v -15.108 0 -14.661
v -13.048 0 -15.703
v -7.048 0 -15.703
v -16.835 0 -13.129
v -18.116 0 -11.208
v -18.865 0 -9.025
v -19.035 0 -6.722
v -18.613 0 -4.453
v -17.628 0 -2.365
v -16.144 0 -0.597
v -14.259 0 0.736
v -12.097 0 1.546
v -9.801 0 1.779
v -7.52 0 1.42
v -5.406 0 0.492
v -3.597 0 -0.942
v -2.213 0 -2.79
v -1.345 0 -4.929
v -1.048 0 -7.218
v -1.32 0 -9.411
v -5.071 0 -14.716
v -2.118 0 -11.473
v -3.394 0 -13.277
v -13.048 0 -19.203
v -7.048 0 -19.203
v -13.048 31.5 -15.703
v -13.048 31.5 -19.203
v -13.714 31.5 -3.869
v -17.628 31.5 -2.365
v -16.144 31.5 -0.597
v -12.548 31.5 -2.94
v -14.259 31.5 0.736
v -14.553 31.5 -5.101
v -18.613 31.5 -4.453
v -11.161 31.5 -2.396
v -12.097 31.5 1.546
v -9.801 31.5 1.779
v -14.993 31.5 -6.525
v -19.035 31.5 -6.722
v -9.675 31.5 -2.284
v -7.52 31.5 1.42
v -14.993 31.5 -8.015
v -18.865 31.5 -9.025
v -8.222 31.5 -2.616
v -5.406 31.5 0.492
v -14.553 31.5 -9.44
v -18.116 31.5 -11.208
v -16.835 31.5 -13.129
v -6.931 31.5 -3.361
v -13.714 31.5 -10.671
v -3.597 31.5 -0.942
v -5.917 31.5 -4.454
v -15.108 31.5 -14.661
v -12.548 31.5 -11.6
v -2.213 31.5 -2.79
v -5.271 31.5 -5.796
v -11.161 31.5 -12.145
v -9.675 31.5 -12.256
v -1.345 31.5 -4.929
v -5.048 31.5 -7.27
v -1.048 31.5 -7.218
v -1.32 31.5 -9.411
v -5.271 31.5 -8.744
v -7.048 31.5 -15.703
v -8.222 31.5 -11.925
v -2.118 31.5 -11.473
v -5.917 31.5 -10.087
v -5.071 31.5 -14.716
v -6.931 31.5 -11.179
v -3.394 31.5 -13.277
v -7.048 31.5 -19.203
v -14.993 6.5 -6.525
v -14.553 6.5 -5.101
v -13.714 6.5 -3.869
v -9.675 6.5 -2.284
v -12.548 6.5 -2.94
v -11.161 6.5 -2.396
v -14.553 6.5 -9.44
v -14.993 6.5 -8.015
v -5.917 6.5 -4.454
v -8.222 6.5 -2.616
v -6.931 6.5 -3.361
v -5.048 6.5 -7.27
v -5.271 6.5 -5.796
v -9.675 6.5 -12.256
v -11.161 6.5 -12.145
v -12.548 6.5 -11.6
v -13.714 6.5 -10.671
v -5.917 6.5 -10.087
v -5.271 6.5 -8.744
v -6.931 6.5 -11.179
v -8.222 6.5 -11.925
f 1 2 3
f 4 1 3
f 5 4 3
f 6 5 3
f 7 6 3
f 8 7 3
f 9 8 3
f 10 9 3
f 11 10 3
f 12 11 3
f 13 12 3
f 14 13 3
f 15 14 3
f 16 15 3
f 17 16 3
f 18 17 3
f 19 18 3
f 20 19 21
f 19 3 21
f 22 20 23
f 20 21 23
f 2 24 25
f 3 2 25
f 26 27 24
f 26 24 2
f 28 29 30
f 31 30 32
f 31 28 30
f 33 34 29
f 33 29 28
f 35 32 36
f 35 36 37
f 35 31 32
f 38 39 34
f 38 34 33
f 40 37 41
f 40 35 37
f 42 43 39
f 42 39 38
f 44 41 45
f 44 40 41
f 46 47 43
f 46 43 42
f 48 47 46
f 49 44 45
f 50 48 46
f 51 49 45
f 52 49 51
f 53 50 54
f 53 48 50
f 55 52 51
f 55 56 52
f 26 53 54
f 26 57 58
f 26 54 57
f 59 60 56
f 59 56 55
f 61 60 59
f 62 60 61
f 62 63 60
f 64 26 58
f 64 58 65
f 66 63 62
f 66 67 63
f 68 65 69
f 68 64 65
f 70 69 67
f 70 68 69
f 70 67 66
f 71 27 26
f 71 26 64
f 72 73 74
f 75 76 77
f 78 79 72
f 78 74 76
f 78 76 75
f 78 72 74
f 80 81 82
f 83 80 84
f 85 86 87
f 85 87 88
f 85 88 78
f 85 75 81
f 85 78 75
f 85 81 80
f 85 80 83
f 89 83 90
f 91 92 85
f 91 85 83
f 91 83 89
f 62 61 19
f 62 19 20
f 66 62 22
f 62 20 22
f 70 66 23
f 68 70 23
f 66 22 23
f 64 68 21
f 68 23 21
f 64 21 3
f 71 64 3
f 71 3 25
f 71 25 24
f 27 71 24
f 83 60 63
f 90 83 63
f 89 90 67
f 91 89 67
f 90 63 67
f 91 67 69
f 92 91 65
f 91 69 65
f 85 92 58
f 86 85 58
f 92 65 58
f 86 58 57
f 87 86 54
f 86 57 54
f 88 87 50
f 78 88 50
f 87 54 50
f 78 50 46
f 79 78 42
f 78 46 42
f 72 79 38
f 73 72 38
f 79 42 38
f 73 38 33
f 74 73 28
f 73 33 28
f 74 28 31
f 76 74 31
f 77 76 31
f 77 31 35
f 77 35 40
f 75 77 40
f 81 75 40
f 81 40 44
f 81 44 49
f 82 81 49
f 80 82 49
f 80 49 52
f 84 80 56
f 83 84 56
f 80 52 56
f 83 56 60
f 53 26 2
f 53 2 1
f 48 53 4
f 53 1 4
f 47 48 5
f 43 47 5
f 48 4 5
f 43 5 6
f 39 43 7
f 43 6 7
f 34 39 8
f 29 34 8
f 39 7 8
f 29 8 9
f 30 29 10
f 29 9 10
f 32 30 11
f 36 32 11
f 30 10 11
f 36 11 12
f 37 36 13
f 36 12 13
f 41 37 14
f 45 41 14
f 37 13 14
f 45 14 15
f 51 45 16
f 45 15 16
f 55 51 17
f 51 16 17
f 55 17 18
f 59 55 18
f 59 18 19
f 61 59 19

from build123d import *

# Parameters (mm, degrees)
BOSS_EXTRUDE1_DEPTH = 31.5
SKETCH5_R           = 5
CUT_EXTRUDE1_DEPTH  = 25


with BuildPart() as part:
    # Sketch1 → Boss-Extrude1 (new body)
    with BuildSketch(Plane(origin=(0, 0, 0), x_dir=(1, 0, 0), z_dir=(0, 1, 0))):
        with BuildLine():
            ThreePointArc((-1.048467756, 7.218012428), (-2.699998527, 12.414164851), (-7.048467756, 15.703293803))
            ThreePointArc((-7.048467756, 15.703293803), (-10.048467756, 16.218012428), (-13.048467756, 15.703293803))
            ThreePointArc((-13.048467756, 15.703293803), (-15.244620178, -0.1304568), (-1.048467756, 7.218012428))
        make_face()
        with BuildLine():
            ThreePointArc((-13.048467756, 15.703293803), (-10.048467756, 16.218012428), (-7.048467756, 15.703293803))
            Line((-7.048467756, 15.703293803), (-7.048467756, 19.203293803))
            Line((-7.048467756, 19.203293803), (-13.048467756, 19.203293803))
            Line((-13.048467756, 19.203293803), (-13.048467756, 15.703293803))
        make_face()
    extrude(amount=BOSS_EXTRUDE1_DEPTH)

    # Sketch5 → Cut-Extrude1 (cut)
    with BuildSketch(Plane(origin=(0, 31.5, 0), x_dir=(1, 0, 0), z_dir=(0, 1, 0))):
        with Locations((-10.048467756, 7.270239538)):
            Circle(SKETCH5_R)
    extrude(amount=-CUT_EXTRUDE1_DEPTH, mode=Mode.SUBTRACT)


solid = part.part
